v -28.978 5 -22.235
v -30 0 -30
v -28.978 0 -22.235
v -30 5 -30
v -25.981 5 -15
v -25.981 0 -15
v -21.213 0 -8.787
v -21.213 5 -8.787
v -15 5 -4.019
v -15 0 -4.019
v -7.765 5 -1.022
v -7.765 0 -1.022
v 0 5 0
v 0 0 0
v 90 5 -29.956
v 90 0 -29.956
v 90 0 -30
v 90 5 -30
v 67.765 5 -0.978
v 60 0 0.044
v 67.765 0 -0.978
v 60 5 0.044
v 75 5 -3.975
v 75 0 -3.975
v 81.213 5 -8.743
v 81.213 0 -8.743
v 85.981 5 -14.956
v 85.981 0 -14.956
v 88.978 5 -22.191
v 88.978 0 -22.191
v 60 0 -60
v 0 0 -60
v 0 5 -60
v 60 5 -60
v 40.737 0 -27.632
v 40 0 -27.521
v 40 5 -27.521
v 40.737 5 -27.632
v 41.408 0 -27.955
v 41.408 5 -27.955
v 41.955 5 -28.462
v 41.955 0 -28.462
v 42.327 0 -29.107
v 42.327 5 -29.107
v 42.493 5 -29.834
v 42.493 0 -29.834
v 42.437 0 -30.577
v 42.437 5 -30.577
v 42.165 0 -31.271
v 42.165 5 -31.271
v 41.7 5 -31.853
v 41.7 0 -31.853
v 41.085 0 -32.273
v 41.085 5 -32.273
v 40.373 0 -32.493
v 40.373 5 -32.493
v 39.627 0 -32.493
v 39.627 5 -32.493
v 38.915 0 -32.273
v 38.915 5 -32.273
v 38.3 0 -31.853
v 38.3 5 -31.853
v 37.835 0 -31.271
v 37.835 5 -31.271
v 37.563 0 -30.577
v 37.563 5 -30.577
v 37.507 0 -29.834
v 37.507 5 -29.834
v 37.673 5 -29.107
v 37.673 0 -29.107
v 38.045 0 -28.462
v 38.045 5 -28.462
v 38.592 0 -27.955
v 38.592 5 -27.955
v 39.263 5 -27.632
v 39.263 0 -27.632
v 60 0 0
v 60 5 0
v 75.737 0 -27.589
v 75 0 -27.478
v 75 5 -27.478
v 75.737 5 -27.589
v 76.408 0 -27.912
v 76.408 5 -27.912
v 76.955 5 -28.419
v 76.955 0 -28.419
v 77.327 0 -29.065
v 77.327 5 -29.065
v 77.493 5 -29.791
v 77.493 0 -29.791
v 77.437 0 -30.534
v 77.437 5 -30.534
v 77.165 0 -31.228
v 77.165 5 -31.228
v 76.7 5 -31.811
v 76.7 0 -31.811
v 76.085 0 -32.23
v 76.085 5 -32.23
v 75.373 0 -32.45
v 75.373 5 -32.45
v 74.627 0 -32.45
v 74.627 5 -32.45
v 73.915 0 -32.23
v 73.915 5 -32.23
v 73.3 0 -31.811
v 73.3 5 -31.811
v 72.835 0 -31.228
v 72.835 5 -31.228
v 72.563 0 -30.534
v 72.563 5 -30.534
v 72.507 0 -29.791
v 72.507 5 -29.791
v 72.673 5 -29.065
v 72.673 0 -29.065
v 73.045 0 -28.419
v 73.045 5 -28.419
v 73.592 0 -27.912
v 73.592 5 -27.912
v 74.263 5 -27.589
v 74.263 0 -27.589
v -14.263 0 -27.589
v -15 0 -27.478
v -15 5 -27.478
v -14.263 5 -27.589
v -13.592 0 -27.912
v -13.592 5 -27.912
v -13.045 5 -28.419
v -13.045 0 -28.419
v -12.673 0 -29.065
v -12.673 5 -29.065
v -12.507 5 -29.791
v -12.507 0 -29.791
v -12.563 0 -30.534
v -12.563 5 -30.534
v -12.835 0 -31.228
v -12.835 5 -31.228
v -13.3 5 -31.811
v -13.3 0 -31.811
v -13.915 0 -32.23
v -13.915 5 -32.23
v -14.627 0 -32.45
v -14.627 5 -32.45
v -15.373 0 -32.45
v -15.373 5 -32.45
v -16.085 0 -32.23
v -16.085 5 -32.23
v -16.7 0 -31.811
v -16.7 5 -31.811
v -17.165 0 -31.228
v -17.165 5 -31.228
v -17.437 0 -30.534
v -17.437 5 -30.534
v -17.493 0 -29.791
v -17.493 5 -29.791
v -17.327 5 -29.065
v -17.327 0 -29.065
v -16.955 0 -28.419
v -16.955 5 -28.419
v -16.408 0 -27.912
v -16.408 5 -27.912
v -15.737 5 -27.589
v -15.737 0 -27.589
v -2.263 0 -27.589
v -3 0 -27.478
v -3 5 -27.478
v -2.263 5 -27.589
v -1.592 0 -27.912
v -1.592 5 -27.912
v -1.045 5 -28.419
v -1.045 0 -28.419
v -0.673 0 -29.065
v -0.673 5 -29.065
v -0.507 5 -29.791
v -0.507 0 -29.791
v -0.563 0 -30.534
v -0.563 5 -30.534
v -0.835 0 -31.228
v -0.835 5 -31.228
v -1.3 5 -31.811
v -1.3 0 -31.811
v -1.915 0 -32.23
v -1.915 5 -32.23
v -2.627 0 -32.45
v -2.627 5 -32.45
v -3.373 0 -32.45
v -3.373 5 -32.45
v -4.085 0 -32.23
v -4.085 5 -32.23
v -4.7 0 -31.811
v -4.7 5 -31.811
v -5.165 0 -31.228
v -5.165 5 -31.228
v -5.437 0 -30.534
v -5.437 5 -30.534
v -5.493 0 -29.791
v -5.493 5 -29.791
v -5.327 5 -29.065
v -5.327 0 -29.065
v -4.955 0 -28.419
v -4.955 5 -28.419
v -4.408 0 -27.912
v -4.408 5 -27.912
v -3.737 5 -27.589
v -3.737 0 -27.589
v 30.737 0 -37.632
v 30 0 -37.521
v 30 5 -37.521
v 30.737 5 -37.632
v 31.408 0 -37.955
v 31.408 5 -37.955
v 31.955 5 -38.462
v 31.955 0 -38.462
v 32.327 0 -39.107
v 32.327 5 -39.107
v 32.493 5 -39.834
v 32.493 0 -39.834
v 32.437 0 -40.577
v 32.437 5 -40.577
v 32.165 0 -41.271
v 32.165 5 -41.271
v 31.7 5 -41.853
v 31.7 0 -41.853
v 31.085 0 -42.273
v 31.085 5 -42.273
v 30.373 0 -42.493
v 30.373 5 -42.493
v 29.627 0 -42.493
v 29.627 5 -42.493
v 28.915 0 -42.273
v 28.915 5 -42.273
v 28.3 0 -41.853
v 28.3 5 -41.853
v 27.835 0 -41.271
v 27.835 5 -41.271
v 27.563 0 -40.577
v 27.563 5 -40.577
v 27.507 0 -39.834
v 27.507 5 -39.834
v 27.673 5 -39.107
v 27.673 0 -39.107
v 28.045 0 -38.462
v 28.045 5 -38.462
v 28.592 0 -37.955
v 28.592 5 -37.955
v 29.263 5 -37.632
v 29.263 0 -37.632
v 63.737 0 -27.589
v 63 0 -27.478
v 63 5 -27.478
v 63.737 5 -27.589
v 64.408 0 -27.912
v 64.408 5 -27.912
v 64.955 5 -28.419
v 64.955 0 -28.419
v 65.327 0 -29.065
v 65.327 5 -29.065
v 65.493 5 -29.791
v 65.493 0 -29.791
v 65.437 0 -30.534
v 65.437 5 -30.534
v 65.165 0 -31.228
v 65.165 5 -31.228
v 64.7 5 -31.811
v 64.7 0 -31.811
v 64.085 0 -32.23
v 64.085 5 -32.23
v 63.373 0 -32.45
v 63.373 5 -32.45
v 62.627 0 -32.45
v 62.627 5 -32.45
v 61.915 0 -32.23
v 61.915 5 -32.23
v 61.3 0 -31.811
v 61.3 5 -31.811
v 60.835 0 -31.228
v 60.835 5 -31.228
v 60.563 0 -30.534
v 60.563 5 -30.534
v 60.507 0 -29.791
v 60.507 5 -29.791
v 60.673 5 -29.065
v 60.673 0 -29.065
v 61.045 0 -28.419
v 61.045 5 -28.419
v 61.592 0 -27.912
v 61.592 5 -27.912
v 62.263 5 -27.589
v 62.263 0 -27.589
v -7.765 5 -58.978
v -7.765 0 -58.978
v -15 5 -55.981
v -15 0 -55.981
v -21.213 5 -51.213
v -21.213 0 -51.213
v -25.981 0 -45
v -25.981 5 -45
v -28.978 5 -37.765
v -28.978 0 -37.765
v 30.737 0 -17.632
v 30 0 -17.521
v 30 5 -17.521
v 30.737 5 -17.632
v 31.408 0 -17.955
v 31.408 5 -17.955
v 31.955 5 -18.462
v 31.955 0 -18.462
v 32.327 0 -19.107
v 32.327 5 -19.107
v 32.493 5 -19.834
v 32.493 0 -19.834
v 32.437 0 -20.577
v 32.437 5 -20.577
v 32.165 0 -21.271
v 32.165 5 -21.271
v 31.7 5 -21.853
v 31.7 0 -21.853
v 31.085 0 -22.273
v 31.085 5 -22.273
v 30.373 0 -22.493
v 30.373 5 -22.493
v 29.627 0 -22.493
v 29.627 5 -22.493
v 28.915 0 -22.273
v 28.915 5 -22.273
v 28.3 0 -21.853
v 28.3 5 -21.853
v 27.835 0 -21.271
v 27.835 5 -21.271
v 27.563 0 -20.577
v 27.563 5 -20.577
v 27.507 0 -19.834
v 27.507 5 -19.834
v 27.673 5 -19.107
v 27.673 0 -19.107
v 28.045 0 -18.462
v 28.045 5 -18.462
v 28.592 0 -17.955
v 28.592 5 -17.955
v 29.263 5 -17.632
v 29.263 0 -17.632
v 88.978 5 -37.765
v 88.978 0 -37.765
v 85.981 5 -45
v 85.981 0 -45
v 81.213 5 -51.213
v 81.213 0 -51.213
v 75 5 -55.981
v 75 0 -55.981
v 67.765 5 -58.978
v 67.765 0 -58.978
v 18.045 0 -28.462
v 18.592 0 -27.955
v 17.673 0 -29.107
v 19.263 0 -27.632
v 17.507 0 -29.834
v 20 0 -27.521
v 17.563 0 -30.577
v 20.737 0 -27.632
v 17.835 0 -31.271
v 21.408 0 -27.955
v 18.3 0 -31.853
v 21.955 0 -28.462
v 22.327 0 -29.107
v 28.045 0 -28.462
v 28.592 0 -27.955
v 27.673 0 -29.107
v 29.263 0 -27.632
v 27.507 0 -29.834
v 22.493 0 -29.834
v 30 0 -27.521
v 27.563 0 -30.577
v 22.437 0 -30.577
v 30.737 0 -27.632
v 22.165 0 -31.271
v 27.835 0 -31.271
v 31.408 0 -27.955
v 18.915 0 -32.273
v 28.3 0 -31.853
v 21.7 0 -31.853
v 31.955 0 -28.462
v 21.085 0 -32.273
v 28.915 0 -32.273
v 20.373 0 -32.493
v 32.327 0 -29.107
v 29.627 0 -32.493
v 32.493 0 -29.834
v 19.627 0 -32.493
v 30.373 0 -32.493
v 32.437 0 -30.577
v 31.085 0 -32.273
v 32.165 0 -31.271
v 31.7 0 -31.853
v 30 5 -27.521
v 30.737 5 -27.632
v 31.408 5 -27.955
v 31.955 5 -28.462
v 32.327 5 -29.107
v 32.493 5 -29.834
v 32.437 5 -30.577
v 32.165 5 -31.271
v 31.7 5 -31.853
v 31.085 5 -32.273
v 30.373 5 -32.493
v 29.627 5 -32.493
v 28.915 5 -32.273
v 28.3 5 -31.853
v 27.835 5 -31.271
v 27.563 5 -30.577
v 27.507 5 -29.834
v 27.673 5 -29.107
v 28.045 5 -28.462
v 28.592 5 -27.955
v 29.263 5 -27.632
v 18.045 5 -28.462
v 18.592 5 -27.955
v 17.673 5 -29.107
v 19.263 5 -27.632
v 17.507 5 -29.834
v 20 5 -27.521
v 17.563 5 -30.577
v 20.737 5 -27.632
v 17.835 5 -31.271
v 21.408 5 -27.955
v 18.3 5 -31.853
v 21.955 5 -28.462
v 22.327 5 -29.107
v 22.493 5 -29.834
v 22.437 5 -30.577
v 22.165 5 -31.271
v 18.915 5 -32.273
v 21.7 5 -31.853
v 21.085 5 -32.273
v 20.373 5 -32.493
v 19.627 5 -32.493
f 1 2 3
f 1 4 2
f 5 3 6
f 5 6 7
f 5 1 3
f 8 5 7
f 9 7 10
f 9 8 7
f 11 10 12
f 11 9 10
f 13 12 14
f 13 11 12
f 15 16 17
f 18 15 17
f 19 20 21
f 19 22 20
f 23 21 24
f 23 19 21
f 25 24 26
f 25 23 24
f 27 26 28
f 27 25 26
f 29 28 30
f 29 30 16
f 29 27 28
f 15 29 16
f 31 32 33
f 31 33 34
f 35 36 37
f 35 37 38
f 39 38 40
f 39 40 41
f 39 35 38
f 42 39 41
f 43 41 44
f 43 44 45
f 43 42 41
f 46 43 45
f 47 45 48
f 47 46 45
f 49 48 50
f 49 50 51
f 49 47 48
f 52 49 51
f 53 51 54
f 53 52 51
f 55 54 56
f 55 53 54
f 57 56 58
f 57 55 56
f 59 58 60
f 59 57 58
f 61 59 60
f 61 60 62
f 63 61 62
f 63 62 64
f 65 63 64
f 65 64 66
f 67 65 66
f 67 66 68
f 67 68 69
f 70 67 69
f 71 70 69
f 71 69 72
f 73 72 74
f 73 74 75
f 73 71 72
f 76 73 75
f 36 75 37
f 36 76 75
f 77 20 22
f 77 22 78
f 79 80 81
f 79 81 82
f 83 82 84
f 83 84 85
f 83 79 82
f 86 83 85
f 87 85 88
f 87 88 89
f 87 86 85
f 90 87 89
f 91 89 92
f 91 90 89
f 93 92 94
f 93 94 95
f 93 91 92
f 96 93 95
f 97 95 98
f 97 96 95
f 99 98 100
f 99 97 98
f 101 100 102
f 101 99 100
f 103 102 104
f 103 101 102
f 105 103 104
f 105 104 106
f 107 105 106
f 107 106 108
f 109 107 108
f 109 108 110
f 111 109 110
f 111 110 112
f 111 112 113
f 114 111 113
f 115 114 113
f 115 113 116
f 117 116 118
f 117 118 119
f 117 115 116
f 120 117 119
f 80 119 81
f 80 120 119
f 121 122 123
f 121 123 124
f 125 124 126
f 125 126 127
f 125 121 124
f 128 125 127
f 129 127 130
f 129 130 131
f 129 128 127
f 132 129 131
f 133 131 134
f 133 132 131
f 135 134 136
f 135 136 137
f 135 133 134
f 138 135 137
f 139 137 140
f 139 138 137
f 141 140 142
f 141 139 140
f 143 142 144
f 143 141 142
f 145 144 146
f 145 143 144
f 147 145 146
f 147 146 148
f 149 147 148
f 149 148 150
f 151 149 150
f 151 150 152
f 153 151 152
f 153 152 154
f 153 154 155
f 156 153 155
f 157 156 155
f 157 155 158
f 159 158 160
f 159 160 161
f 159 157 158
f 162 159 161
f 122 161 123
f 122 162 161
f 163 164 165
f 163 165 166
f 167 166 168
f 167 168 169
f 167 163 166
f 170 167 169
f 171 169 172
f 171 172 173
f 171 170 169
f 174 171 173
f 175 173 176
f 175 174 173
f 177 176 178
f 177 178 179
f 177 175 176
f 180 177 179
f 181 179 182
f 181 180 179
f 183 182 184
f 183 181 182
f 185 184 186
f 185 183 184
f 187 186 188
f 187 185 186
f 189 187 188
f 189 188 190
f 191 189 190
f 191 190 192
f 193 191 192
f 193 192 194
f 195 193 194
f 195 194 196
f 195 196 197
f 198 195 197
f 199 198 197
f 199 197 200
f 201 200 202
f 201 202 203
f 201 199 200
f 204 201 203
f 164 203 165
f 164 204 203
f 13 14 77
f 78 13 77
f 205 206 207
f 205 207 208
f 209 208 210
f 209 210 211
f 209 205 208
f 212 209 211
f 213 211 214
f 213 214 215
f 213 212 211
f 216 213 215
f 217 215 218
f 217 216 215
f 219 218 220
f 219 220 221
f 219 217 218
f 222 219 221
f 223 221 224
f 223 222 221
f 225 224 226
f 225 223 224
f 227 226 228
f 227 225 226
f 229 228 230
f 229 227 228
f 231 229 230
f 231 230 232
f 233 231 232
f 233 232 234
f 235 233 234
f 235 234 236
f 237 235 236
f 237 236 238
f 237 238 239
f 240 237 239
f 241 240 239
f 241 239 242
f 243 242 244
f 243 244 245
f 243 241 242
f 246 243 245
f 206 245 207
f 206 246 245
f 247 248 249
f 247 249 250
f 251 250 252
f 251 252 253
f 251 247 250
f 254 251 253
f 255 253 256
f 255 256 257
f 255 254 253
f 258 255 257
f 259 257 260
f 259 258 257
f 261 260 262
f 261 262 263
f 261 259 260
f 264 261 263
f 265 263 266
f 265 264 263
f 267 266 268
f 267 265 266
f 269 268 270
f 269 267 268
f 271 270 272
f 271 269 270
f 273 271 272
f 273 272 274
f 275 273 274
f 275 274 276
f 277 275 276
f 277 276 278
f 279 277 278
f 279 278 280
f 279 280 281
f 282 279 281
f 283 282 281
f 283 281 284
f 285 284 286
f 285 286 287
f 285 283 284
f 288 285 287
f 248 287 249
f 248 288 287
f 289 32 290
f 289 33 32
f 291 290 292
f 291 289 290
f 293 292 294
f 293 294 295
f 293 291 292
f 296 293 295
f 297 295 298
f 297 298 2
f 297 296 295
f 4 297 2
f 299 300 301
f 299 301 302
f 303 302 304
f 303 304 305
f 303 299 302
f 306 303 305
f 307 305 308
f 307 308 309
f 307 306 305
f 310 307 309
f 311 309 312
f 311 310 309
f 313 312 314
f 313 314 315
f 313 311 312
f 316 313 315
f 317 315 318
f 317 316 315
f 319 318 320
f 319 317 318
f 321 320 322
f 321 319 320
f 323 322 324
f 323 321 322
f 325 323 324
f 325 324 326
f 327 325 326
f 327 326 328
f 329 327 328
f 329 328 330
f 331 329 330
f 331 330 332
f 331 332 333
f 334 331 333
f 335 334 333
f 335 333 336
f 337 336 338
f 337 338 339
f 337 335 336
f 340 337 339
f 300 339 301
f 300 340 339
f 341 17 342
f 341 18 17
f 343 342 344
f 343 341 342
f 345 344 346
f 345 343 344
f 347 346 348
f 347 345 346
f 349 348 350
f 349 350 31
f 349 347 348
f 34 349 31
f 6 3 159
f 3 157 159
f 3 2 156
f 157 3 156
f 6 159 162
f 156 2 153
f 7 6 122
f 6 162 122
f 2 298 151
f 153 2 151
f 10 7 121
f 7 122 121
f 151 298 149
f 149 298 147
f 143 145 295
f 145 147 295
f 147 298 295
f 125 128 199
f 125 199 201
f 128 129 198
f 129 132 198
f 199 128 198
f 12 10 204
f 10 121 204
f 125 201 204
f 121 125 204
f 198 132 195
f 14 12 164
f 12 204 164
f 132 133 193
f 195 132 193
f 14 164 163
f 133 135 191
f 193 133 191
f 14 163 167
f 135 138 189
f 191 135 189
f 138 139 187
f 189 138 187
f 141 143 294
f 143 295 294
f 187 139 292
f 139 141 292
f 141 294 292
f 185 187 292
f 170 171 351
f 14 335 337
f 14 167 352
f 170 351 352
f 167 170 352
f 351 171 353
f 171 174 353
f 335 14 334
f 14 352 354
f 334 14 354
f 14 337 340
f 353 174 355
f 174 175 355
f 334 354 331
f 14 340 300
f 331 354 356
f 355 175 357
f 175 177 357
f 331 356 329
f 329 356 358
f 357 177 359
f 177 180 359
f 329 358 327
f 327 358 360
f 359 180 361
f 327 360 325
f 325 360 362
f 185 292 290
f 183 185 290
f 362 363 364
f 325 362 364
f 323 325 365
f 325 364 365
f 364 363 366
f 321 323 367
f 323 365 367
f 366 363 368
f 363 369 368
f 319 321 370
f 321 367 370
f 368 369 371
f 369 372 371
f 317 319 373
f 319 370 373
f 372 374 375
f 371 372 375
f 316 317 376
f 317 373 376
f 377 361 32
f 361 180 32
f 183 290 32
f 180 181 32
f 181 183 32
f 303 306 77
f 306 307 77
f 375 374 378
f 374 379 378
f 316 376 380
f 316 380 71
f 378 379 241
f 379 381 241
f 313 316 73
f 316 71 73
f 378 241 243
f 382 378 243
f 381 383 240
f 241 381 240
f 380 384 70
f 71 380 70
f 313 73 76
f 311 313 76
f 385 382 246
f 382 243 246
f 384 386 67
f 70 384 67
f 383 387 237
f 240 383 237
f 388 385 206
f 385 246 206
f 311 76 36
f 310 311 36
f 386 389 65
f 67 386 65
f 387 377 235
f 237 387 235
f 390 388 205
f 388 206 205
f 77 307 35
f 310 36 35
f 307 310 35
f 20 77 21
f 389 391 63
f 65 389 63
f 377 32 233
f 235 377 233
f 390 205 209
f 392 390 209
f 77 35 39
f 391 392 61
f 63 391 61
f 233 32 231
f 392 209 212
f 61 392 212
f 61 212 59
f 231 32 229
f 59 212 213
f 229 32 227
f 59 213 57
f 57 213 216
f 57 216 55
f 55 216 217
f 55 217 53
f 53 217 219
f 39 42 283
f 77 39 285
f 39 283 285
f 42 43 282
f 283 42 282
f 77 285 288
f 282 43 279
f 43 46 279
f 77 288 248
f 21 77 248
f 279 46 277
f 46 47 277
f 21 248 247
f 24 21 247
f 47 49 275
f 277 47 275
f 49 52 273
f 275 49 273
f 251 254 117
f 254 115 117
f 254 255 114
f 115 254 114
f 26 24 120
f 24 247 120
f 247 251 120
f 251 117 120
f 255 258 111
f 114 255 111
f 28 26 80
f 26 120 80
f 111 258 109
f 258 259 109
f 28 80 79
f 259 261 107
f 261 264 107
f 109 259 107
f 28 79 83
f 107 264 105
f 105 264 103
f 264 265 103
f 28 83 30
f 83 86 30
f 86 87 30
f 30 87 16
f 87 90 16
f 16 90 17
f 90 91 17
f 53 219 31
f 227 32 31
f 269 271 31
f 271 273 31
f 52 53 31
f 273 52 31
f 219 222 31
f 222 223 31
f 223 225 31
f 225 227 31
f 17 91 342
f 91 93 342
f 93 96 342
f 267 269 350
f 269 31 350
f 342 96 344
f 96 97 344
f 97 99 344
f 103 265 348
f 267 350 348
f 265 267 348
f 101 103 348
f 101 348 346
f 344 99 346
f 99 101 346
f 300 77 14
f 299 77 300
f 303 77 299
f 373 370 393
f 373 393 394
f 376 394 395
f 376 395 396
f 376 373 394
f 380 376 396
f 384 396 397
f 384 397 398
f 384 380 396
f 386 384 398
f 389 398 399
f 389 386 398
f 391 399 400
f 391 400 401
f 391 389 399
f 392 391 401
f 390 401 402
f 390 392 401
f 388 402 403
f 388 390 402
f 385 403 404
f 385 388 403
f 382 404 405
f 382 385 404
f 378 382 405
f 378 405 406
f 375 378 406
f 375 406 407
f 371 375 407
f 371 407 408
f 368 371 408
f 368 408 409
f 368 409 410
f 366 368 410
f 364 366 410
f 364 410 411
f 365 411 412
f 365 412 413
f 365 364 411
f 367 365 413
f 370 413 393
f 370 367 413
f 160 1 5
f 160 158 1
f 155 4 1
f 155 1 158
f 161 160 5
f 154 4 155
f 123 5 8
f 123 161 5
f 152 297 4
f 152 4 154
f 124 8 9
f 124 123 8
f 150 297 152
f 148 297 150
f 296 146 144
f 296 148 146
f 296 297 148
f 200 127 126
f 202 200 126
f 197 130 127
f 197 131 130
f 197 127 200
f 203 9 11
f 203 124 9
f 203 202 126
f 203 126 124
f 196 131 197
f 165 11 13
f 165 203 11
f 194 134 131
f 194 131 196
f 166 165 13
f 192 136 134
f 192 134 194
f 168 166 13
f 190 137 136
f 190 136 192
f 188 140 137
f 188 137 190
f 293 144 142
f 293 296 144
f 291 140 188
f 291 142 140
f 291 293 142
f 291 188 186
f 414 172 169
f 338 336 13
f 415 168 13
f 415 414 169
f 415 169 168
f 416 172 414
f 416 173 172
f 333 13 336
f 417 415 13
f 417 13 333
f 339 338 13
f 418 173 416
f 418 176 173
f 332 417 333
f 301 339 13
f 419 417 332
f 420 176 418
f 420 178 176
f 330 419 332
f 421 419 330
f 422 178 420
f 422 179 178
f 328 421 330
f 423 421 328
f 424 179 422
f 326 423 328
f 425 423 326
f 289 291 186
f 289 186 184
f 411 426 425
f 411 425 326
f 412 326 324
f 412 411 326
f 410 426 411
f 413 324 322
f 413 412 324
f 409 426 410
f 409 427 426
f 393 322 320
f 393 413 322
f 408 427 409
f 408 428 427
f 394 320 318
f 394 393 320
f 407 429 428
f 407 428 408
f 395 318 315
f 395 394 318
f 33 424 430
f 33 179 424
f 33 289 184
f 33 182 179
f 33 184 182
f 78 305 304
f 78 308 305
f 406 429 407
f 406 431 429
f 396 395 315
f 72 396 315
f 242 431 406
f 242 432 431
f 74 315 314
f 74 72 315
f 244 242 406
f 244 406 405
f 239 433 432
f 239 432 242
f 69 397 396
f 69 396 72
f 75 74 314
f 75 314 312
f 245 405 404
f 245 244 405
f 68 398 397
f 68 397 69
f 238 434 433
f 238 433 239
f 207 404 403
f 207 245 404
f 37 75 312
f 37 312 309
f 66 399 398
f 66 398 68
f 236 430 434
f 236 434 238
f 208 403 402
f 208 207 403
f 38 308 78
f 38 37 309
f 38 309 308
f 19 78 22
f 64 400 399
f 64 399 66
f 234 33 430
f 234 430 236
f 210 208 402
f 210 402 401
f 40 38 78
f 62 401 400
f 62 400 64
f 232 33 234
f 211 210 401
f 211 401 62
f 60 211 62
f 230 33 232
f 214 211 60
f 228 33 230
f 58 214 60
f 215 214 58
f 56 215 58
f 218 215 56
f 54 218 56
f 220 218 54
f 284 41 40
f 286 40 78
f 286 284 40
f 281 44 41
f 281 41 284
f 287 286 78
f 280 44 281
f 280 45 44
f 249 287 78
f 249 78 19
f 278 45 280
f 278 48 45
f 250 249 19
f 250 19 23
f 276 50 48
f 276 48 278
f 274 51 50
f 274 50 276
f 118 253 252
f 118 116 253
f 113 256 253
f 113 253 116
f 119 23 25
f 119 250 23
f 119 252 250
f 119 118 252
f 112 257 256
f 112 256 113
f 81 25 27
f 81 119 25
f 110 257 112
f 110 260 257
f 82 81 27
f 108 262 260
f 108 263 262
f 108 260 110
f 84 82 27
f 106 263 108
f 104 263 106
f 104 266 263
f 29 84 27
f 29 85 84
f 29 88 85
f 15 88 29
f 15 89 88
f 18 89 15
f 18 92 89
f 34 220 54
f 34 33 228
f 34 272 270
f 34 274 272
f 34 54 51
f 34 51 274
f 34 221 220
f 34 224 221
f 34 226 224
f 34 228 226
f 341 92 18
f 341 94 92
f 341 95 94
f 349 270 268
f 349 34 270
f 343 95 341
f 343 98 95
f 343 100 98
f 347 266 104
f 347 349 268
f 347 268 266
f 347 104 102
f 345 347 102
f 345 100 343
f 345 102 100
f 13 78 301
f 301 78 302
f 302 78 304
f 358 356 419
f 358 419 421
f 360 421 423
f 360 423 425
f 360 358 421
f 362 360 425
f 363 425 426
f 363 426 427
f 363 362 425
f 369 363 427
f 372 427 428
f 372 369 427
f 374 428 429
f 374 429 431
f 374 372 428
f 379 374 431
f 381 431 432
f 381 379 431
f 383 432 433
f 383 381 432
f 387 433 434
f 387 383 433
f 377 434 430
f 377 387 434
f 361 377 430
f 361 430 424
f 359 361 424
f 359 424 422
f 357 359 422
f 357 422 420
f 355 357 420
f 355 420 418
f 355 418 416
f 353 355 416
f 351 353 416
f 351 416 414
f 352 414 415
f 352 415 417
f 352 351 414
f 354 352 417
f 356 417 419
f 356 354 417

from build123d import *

# Parameters (mm, degrees)
SKETCH1_W           = 60
SKETCH1_H           = 60
SKETCH1_R           = 2.5
BOSS_EXTRUDE2_DEPTH = 5
SKETCH4_W           = 30
SKETCH4_H           = 60.044205022
SKETCH4_R           = 2.5
SKETCH4_H_2         = 60
BOSS_EXTRUDE5_DEPTH = 5
FILLET1_R           = 30


with BuildPart() as part:
    # Sketch1 → Boss-Extrude2 (new body)
    with BuildSketch(Plane(origin=(0, 0, 0), x_dir=(1, 0, 0), z_dir=(0, 1, 0))):
        with Locations((30, 30)):
            Rectangle(SKETCH1_W, SKETCH1_H)
        with Locations(Location((30, 40.020671676, 0), (0, 0, 270))):
            Circle(SKETCH1_R, mode=Mode.SUBTRACT)
        with Locations(Location((20, 30.020671676, 0), (0, 0, 270))):
            Circle(SKETCH1_R, mode=Mode.SUBTRACT)
        with Locations(Location((30, 20.020671676, 0), (0, 0, 270))):
            Circle(SKETCH1_R, mode=Mode.SUBTRACT)
        with Locations(Location((40, 30.020671676, 0), (0, 0, 270))):
            Circle(SKETCH1_R, mode=Mode.SUBTRACT)
        with Locations(Location((30, 30.020671676, 0), (0, 0, 270))):
            Circle(SKETCH1_R, mode=Mode.SUBTRACT)
    extrude(amount=BOSS_EXTRUDE2_DEPTH)

    # Sketch4 → Boss-Extrude5 (add)
    # profile 1 of 2: a face of its own
    with BuildSketch(Plane(origin=(0, 0, 0), x_dir=(1, 0, 0), z_dir=(0, 1, 0))):
        with Locations((75, 29.977897489)):
            Rectangle(SKETCH4_W, SKETCH4_H)
        with Locations(Location((63, 29.977897489, 0), (0, 0, 270))):
            Circle(SKETCH4_R, mode=Mode.SUBTRACT)
        with Locations(Location((75, 29.977897489, 0), (0, 0, 270))):
            Circle(SKETCH4_R, mode=Mode.SUBTRACT)
    # profile 2 of 2: a face of its own
    with BuildSketch(Plane(origin=(0, 0, 0), x_dir=(1, 0, 0), z_dir=(0, 1, 0))):
        with Locations((-15, 30)):
            Rectangle(SKETCH4_W, SKETCH4_H_2)
        with Locations(Location((-3, 29.977897489, 0), (0, 0, 270))):
            Circle(SKETCH4_R, mode=Mode.SUBTRACT)
        with Locations(Location((-15, 29.977897489, 0), (0, 0, 270))):
            Circle(SKETCH4_R, mode=Mode.SUBTRACT)
    extrude(amount=BOSS_EXTRUDE5_DEPTH)

    # Fillet1
    fillet1_edges = [part.edges().sort_by_distance(p)[0] for p in [
        (-30, 2.5, 0),
        (-30, 2.5, -60),
        (90, 2.5, 0.044205022),
        (90, 2.5, -60),
    ]]
    fillet(fillet1_edges, radius=FILLET1_R - 0.0001)  # a hair under: the kernel refuses the full size


solid = part.part
